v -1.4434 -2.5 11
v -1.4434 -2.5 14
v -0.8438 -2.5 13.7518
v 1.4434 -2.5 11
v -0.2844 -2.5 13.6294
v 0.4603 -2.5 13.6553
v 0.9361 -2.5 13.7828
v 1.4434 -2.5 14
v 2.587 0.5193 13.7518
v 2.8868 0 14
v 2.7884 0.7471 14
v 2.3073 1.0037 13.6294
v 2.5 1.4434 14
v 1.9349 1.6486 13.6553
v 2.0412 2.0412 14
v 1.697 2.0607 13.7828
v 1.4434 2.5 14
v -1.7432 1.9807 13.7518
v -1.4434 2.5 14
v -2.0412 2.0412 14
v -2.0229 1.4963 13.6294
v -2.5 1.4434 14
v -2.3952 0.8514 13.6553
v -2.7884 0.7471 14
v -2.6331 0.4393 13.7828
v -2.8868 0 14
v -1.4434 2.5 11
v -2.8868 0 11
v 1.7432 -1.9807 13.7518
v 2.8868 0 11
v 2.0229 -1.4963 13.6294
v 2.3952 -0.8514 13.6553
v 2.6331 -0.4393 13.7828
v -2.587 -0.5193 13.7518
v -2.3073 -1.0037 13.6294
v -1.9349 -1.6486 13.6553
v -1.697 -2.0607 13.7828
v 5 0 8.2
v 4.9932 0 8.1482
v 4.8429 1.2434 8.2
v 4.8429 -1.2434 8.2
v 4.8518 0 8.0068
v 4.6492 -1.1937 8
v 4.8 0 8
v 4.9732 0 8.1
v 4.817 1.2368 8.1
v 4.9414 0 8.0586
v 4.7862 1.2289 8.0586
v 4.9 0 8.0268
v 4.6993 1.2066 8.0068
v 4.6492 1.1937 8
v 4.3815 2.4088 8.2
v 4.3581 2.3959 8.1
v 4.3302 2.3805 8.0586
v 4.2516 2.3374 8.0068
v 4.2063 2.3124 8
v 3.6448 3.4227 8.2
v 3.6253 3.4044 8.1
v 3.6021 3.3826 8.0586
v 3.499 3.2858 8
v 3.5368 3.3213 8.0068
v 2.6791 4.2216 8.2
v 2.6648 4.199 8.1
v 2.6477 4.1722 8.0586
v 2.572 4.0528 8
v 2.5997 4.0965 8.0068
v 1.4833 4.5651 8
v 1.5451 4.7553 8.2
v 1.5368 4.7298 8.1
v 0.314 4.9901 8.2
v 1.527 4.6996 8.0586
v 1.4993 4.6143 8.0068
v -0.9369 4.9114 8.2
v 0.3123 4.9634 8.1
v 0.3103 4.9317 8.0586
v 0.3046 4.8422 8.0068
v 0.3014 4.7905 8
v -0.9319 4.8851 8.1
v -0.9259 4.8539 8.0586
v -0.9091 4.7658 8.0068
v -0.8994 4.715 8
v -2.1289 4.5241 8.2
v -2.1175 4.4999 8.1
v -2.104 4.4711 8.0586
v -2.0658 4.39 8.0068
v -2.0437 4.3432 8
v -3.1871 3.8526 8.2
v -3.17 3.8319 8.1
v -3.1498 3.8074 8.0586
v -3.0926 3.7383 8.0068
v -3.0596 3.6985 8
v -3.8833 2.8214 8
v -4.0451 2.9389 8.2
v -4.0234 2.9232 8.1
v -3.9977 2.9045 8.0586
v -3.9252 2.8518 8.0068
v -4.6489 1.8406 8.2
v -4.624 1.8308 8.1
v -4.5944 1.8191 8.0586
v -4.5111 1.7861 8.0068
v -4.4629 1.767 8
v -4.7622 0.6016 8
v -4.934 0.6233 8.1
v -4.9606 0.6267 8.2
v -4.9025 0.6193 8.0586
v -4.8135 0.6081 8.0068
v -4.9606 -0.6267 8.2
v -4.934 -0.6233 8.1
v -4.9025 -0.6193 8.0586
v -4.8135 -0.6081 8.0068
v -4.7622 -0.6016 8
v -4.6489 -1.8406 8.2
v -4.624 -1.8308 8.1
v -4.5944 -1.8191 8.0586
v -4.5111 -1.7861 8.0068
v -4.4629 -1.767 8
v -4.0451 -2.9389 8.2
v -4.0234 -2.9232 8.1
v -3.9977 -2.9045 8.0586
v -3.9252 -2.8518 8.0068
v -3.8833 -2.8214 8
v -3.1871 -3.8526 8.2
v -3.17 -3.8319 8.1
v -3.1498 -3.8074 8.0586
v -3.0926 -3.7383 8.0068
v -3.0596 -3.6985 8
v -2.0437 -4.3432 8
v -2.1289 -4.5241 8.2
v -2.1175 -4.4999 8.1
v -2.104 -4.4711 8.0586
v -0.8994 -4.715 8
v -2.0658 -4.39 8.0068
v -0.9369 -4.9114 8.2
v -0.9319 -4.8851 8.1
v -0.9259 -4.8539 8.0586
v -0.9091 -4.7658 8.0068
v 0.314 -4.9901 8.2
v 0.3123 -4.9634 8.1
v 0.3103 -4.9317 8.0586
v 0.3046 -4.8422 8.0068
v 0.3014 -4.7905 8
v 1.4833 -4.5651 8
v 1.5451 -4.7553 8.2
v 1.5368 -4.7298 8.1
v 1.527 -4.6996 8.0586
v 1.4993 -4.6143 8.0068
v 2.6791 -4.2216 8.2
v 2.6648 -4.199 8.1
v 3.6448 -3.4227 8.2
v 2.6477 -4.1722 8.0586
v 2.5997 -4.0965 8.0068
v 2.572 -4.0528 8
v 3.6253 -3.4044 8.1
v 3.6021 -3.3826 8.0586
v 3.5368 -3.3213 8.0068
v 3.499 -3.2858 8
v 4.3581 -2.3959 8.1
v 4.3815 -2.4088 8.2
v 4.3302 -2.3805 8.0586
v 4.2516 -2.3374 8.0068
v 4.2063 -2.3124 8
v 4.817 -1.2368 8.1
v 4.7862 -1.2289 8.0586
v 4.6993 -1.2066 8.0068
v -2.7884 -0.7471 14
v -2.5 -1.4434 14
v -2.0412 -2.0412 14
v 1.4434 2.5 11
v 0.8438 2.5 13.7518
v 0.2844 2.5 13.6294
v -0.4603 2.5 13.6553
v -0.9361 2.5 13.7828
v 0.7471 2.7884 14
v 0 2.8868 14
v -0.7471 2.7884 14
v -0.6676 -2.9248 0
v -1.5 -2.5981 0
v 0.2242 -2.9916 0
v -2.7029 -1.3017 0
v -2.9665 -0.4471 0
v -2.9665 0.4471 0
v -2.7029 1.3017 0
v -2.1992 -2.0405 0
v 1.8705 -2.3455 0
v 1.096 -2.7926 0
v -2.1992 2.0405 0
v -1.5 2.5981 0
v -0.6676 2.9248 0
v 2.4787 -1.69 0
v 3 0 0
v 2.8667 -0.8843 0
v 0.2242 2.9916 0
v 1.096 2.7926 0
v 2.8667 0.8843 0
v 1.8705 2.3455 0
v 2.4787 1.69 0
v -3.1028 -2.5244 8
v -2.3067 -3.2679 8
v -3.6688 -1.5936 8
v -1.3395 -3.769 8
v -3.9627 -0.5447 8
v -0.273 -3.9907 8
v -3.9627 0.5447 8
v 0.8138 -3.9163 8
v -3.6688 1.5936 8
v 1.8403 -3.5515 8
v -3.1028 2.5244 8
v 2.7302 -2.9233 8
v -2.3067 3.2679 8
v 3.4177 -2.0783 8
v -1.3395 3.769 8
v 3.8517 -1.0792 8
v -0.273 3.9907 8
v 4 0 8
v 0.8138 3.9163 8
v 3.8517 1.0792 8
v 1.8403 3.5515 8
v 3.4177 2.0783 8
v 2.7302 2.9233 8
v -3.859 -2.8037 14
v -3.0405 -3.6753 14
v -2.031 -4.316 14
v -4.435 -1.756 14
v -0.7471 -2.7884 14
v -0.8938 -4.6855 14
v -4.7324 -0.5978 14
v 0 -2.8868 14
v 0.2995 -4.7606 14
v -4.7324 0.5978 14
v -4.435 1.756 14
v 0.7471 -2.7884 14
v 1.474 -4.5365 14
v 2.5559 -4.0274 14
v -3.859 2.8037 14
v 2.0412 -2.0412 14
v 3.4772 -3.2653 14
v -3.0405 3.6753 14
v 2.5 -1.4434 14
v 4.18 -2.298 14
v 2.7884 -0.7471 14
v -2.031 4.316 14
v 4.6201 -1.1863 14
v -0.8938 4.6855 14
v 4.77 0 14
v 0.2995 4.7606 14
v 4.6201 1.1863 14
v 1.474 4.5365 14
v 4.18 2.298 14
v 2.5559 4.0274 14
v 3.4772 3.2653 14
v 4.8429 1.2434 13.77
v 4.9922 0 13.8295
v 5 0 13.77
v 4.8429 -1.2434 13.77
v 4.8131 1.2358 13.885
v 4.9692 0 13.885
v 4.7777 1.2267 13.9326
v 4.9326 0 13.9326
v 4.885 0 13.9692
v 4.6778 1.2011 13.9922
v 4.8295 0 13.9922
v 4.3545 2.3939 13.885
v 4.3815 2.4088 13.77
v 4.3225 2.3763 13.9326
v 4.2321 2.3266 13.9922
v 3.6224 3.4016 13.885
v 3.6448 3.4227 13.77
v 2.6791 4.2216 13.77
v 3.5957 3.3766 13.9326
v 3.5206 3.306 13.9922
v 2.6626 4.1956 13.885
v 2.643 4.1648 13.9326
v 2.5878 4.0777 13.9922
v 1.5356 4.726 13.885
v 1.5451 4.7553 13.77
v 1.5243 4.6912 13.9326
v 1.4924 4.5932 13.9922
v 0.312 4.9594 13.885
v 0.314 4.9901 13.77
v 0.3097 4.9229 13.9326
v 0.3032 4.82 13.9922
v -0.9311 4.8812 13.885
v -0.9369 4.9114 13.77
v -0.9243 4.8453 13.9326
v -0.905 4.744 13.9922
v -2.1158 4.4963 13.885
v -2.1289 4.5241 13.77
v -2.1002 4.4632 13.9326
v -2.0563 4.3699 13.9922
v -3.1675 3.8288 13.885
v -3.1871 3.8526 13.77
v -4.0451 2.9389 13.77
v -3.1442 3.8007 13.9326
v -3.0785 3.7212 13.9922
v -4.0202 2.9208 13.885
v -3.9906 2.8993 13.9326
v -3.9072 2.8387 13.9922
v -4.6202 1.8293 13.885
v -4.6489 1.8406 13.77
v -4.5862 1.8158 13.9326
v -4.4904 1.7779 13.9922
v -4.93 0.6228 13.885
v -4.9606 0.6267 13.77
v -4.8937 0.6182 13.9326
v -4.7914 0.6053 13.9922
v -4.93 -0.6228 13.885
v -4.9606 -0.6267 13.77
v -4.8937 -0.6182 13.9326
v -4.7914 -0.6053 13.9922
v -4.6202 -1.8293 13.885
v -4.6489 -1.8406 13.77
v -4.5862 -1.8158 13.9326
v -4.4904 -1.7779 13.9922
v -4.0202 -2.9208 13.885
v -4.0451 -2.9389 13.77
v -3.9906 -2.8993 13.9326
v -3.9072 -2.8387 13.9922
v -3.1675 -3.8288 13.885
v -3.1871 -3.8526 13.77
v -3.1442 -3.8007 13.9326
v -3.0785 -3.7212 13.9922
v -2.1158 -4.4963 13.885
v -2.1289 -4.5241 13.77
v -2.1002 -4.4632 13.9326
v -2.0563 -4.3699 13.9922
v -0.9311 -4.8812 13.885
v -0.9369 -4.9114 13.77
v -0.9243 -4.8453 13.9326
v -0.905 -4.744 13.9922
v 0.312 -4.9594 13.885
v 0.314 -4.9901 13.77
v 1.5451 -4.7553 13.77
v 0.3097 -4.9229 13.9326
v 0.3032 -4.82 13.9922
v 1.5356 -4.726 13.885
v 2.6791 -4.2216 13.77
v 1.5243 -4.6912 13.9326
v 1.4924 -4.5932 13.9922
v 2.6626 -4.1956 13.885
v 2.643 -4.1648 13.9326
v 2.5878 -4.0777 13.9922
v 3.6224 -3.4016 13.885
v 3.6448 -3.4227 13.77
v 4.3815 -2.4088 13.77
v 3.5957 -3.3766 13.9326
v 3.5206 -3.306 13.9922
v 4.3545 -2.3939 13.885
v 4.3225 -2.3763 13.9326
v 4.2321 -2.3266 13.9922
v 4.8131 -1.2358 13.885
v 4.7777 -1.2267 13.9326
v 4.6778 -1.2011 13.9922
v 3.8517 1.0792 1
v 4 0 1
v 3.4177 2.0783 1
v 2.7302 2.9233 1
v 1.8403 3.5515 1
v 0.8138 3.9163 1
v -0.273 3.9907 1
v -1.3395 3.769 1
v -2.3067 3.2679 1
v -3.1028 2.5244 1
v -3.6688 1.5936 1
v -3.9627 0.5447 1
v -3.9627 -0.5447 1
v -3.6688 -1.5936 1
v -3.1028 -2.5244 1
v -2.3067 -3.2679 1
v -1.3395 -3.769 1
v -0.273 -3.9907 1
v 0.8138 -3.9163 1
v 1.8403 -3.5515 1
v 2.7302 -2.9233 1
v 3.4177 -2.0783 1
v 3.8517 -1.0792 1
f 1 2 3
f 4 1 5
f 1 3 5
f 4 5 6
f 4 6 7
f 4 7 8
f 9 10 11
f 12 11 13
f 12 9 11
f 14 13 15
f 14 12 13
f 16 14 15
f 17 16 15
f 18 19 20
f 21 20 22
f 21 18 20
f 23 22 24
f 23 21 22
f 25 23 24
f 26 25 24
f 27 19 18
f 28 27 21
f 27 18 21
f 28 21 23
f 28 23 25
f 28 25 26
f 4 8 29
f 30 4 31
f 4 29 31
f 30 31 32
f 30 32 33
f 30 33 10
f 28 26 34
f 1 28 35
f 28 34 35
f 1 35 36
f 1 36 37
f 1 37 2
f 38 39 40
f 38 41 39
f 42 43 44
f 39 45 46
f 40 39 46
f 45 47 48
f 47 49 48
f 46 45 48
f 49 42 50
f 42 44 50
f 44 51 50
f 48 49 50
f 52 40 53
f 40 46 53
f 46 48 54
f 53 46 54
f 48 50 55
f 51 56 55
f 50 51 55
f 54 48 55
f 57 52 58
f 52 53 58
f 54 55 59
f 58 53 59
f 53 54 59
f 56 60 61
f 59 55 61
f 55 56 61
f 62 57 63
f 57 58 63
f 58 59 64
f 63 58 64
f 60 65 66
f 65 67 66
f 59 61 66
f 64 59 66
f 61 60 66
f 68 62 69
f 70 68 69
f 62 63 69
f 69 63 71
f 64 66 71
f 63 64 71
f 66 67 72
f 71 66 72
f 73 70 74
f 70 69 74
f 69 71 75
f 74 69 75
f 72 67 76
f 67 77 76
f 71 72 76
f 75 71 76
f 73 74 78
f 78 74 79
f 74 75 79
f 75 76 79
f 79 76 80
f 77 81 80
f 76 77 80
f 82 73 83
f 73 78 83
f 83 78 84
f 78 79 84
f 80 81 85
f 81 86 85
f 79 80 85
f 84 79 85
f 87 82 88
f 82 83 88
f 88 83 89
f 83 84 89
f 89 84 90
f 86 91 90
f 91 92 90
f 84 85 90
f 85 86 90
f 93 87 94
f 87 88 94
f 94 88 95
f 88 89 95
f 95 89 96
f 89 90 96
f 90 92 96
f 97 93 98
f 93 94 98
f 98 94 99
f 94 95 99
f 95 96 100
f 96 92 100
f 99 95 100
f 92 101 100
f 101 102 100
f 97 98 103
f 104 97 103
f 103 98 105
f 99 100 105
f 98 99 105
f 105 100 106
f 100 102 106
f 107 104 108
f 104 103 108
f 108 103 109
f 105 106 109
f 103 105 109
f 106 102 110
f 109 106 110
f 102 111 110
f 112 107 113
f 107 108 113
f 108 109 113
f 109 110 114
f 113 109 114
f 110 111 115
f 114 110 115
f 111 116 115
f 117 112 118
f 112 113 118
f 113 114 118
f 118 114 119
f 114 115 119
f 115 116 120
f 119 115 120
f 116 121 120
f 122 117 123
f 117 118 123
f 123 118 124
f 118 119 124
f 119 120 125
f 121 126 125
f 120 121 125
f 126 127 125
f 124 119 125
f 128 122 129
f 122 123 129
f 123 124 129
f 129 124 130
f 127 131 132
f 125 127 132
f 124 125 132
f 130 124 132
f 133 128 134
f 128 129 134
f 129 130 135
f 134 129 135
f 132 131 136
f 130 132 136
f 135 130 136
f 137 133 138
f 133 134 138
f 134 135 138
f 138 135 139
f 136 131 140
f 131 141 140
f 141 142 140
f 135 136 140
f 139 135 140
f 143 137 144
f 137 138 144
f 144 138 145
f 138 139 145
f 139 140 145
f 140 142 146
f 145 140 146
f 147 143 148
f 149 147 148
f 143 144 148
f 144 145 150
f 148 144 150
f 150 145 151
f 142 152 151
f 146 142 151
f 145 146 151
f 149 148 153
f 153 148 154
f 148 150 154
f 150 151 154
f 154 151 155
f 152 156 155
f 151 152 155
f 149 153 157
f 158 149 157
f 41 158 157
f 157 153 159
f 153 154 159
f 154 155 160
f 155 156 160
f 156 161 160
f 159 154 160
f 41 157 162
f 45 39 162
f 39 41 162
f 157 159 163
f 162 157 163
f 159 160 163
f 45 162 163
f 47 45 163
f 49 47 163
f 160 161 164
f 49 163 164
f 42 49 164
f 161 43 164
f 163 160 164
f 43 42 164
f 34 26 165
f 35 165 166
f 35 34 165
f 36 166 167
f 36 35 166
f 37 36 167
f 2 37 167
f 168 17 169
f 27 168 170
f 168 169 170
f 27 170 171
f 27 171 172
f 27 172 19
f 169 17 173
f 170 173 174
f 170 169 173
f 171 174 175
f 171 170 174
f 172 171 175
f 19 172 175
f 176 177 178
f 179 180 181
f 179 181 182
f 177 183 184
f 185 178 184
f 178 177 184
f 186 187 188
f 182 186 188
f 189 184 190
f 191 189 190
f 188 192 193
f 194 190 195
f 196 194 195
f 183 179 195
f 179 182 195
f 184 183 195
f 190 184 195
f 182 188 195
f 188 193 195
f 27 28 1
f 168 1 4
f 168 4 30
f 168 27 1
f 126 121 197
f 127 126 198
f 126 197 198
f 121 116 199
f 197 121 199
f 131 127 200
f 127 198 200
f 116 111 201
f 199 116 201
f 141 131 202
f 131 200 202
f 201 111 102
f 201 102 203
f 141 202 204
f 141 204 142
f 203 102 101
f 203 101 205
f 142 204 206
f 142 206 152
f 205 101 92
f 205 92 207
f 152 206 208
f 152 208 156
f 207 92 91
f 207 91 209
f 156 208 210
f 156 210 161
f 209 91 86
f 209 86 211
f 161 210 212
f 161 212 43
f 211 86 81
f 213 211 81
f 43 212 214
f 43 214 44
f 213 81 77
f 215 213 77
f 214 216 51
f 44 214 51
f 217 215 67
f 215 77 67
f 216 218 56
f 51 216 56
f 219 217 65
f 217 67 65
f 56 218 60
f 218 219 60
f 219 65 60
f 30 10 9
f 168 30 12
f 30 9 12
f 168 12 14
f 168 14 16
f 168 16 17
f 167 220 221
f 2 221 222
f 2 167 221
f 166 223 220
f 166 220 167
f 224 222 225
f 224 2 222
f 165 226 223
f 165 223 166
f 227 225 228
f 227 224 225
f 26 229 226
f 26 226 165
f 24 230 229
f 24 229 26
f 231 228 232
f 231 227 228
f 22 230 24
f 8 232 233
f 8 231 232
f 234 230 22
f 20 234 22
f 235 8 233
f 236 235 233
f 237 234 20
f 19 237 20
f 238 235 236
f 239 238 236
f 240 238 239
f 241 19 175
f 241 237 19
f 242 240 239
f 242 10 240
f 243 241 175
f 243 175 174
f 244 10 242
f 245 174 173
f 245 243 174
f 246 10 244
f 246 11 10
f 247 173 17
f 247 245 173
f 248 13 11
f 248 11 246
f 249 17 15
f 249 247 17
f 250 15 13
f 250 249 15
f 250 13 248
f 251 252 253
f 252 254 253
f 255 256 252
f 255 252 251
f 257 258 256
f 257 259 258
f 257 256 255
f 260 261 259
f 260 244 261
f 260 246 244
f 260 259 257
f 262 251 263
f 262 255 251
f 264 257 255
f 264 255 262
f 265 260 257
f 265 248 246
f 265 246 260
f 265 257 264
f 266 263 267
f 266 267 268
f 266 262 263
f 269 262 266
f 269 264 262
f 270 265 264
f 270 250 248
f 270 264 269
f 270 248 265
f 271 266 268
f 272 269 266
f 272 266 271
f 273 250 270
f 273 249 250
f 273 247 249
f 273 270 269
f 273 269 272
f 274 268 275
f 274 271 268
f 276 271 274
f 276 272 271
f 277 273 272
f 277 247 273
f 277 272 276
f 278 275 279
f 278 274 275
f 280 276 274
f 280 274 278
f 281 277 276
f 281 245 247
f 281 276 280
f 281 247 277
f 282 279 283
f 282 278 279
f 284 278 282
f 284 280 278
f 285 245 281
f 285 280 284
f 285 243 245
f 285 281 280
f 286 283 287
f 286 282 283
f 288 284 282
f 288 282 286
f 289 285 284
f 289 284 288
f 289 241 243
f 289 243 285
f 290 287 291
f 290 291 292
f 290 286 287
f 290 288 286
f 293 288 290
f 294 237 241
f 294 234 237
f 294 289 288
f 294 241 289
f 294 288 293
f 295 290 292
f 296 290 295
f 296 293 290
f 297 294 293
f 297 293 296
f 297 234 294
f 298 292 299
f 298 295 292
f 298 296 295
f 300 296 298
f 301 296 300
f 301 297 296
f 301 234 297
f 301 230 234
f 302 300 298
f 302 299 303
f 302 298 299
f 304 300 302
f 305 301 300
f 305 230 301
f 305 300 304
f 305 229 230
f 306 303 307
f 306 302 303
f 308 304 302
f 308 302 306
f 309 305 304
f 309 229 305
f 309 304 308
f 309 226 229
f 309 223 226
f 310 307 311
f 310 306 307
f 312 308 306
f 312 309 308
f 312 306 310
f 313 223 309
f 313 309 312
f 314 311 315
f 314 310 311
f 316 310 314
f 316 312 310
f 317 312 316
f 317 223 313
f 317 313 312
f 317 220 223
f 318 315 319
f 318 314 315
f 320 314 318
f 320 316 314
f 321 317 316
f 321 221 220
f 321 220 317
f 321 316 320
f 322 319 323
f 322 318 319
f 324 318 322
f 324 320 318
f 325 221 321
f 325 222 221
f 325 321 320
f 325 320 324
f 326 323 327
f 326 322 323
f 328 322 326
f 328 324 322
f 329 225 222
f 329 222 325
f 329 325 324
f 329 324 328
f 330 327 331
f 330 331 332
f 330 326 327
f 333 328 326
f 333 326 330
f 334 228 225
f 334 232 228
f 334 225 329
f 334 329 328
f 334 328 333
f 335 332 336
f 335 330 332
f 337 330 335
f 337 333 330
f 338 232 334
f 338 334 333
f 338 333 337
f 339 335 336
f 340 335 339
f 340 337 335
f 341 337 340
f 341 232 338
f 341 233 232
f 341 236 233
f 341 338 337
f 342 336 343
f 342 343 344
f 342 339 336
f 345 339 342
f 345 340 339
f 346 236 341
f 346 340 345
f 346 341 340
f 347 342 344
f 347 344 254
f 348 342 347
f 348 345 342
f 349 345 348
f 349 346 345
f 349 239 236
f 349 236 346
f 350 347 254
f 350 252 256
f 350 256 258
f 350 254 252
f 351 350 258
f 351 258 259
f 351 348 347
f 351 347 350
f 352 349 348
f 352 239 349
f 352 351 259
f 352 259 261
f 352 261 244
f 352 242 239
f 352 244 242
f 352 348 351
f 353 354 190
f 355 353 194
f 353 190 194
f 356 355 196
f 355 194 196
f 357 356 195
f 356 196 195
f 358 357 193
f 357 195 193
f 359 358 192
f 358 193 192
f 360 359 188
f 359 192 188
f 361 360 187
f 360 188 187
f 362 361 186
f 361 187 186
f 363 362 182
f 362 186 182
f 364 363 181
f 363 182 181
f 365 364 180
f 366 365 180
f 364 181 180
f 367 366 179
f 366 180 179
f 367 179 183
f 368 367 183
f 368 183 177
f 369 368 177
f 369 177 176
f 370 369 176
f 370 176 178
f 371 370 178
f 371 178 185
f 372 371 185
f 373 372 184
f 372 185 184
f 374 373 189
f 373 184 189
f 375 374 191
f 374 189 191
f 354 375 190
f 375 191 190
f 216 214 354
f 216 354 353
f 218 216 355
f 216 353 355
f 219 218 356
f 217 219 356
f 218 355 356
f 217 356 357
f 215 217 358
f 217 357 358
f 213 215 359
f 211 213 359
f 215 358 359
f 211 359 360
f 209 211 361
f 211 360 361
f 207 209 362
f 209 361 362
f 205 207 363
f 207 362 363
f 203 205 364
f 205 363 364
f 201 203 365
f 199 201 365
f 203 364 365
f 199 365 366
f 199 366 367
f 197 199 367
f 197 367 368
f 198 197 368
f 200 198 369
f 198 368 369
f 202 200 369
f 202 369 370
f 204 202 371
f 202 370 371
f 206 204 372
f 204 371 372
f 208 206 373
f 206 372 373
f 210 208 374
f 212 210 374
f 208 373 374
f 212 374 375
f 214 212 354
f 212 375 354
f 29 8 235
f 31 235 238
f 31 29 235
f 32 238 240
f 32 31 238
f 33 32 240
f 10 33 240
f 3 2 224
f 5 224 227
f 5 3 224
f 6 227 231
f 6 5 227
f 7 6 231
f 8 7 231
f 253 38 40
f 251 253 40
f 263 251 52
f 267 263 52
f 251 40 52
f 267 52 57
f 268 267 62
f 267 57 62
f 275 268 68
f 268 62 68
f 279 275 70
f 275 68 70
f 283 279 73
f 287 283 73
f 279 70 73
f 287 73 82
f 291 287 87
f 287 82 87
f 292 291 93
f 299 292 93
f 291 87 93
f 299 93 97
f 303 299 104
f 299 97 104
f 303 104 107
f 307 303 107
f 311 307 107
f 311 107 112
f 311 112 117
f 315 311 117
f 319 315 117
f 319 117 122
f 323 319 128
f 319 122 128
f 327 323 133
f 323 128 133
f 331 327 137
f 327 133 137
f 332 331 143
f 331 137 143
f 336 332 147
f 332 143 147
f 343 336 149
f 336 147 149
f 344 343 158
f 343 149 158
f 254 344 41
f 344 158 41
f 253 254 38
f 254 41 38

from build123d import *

# Parameters (mm, degrees)
SCHIZZO1_R                   = 4
ESTRUSIONE_ESTRUSIONE1_DEPTH = 8
SMUSSO1_SIZE                 = 1
SCHIZZO6_R                   = 5
ESTRUSIONE_ESTRUSIONE3_DEPTH = 6
TAGLIO_ESTRUSIONE3_DEPTH     = 3
SCHIZZO8_R                   = 2.886751346
TAGLIO_ESTRUSIONE4_DEPTH     = 1
TAGLIO_ESTRUSIONE4_TAPER     = 45
RACCORDO1_R                  = 0.23
RACCORDO2_R                  = 0.2


with BuildPart() as part:
    # Schizzo1 → Estrusione-Estrusione1 (new body)
    with BuildSketch(Plane.XY):
        Circle(SCHIZZO1_R)
    extrude(amount=ESTRUSIONE_ESTRUSIONE1_DEPTH)

    # Smusso1
    smusso1_edges = [part.edges().sort_by_distance(p)[0] for p in [
        (-4, 0, 0),
    ]]
    chamfer(smusso1_edges, length=SMUSSO1_SIZE)

    # Schizzo6 → Estrusione-Estrusione3 (add)
    with BuildSketch(Plane.XY.offset(8)):
        Circle(SCHIZZO6_R)
    extrude(amount=ESTRUSIONE_ESTRUSIONE3_DEPTH)

    # Schizzo7 → Taglio-Estrusione3 (cut)
    with BuildSketch(Plane.XY.offset(14)):
        Polygon((1.443375673, 2.5), (-1.443375673, 2.5), (-2.886751346, 0), (-1.443375673, -2.5), (1.443375673, -2.5), (2.886751346, 0), align=None)
    extrude(amount=-TAGLIO_ESTRUSIONE3_DEPTH, mode=Mode.SUBTRACT)

    # Schizzo8 → Taglio-Estrusione4 (cut)
    with BuildSketch(Plane.XY.offset(14)):
        Circle(SCHIZZO8_R)
    extrude(amount=-TAGLIO_ESTRUSIONE4_DEPTH, taper=TAGLIO_ESTRUSIONE4_TAPER, mode=Mode.SUBTRACT)

    # Raccordo1
    raccordo1_edges = [part.edges().sort_by_distance(p)[0] for p in [
        (-5, 0, 14),
    ]]
    fillet(raccordo1_edges, radius=RACCORDO1_R)

    # Raccordo2
    raccordo2_edges = [part.edges().sort_by_distance(p)[0] for p in [
        (-5, 0, 8),
    ]]
    fillet(raccordo2_edges, radius=RACCORDO2_R)


solid = part.part
